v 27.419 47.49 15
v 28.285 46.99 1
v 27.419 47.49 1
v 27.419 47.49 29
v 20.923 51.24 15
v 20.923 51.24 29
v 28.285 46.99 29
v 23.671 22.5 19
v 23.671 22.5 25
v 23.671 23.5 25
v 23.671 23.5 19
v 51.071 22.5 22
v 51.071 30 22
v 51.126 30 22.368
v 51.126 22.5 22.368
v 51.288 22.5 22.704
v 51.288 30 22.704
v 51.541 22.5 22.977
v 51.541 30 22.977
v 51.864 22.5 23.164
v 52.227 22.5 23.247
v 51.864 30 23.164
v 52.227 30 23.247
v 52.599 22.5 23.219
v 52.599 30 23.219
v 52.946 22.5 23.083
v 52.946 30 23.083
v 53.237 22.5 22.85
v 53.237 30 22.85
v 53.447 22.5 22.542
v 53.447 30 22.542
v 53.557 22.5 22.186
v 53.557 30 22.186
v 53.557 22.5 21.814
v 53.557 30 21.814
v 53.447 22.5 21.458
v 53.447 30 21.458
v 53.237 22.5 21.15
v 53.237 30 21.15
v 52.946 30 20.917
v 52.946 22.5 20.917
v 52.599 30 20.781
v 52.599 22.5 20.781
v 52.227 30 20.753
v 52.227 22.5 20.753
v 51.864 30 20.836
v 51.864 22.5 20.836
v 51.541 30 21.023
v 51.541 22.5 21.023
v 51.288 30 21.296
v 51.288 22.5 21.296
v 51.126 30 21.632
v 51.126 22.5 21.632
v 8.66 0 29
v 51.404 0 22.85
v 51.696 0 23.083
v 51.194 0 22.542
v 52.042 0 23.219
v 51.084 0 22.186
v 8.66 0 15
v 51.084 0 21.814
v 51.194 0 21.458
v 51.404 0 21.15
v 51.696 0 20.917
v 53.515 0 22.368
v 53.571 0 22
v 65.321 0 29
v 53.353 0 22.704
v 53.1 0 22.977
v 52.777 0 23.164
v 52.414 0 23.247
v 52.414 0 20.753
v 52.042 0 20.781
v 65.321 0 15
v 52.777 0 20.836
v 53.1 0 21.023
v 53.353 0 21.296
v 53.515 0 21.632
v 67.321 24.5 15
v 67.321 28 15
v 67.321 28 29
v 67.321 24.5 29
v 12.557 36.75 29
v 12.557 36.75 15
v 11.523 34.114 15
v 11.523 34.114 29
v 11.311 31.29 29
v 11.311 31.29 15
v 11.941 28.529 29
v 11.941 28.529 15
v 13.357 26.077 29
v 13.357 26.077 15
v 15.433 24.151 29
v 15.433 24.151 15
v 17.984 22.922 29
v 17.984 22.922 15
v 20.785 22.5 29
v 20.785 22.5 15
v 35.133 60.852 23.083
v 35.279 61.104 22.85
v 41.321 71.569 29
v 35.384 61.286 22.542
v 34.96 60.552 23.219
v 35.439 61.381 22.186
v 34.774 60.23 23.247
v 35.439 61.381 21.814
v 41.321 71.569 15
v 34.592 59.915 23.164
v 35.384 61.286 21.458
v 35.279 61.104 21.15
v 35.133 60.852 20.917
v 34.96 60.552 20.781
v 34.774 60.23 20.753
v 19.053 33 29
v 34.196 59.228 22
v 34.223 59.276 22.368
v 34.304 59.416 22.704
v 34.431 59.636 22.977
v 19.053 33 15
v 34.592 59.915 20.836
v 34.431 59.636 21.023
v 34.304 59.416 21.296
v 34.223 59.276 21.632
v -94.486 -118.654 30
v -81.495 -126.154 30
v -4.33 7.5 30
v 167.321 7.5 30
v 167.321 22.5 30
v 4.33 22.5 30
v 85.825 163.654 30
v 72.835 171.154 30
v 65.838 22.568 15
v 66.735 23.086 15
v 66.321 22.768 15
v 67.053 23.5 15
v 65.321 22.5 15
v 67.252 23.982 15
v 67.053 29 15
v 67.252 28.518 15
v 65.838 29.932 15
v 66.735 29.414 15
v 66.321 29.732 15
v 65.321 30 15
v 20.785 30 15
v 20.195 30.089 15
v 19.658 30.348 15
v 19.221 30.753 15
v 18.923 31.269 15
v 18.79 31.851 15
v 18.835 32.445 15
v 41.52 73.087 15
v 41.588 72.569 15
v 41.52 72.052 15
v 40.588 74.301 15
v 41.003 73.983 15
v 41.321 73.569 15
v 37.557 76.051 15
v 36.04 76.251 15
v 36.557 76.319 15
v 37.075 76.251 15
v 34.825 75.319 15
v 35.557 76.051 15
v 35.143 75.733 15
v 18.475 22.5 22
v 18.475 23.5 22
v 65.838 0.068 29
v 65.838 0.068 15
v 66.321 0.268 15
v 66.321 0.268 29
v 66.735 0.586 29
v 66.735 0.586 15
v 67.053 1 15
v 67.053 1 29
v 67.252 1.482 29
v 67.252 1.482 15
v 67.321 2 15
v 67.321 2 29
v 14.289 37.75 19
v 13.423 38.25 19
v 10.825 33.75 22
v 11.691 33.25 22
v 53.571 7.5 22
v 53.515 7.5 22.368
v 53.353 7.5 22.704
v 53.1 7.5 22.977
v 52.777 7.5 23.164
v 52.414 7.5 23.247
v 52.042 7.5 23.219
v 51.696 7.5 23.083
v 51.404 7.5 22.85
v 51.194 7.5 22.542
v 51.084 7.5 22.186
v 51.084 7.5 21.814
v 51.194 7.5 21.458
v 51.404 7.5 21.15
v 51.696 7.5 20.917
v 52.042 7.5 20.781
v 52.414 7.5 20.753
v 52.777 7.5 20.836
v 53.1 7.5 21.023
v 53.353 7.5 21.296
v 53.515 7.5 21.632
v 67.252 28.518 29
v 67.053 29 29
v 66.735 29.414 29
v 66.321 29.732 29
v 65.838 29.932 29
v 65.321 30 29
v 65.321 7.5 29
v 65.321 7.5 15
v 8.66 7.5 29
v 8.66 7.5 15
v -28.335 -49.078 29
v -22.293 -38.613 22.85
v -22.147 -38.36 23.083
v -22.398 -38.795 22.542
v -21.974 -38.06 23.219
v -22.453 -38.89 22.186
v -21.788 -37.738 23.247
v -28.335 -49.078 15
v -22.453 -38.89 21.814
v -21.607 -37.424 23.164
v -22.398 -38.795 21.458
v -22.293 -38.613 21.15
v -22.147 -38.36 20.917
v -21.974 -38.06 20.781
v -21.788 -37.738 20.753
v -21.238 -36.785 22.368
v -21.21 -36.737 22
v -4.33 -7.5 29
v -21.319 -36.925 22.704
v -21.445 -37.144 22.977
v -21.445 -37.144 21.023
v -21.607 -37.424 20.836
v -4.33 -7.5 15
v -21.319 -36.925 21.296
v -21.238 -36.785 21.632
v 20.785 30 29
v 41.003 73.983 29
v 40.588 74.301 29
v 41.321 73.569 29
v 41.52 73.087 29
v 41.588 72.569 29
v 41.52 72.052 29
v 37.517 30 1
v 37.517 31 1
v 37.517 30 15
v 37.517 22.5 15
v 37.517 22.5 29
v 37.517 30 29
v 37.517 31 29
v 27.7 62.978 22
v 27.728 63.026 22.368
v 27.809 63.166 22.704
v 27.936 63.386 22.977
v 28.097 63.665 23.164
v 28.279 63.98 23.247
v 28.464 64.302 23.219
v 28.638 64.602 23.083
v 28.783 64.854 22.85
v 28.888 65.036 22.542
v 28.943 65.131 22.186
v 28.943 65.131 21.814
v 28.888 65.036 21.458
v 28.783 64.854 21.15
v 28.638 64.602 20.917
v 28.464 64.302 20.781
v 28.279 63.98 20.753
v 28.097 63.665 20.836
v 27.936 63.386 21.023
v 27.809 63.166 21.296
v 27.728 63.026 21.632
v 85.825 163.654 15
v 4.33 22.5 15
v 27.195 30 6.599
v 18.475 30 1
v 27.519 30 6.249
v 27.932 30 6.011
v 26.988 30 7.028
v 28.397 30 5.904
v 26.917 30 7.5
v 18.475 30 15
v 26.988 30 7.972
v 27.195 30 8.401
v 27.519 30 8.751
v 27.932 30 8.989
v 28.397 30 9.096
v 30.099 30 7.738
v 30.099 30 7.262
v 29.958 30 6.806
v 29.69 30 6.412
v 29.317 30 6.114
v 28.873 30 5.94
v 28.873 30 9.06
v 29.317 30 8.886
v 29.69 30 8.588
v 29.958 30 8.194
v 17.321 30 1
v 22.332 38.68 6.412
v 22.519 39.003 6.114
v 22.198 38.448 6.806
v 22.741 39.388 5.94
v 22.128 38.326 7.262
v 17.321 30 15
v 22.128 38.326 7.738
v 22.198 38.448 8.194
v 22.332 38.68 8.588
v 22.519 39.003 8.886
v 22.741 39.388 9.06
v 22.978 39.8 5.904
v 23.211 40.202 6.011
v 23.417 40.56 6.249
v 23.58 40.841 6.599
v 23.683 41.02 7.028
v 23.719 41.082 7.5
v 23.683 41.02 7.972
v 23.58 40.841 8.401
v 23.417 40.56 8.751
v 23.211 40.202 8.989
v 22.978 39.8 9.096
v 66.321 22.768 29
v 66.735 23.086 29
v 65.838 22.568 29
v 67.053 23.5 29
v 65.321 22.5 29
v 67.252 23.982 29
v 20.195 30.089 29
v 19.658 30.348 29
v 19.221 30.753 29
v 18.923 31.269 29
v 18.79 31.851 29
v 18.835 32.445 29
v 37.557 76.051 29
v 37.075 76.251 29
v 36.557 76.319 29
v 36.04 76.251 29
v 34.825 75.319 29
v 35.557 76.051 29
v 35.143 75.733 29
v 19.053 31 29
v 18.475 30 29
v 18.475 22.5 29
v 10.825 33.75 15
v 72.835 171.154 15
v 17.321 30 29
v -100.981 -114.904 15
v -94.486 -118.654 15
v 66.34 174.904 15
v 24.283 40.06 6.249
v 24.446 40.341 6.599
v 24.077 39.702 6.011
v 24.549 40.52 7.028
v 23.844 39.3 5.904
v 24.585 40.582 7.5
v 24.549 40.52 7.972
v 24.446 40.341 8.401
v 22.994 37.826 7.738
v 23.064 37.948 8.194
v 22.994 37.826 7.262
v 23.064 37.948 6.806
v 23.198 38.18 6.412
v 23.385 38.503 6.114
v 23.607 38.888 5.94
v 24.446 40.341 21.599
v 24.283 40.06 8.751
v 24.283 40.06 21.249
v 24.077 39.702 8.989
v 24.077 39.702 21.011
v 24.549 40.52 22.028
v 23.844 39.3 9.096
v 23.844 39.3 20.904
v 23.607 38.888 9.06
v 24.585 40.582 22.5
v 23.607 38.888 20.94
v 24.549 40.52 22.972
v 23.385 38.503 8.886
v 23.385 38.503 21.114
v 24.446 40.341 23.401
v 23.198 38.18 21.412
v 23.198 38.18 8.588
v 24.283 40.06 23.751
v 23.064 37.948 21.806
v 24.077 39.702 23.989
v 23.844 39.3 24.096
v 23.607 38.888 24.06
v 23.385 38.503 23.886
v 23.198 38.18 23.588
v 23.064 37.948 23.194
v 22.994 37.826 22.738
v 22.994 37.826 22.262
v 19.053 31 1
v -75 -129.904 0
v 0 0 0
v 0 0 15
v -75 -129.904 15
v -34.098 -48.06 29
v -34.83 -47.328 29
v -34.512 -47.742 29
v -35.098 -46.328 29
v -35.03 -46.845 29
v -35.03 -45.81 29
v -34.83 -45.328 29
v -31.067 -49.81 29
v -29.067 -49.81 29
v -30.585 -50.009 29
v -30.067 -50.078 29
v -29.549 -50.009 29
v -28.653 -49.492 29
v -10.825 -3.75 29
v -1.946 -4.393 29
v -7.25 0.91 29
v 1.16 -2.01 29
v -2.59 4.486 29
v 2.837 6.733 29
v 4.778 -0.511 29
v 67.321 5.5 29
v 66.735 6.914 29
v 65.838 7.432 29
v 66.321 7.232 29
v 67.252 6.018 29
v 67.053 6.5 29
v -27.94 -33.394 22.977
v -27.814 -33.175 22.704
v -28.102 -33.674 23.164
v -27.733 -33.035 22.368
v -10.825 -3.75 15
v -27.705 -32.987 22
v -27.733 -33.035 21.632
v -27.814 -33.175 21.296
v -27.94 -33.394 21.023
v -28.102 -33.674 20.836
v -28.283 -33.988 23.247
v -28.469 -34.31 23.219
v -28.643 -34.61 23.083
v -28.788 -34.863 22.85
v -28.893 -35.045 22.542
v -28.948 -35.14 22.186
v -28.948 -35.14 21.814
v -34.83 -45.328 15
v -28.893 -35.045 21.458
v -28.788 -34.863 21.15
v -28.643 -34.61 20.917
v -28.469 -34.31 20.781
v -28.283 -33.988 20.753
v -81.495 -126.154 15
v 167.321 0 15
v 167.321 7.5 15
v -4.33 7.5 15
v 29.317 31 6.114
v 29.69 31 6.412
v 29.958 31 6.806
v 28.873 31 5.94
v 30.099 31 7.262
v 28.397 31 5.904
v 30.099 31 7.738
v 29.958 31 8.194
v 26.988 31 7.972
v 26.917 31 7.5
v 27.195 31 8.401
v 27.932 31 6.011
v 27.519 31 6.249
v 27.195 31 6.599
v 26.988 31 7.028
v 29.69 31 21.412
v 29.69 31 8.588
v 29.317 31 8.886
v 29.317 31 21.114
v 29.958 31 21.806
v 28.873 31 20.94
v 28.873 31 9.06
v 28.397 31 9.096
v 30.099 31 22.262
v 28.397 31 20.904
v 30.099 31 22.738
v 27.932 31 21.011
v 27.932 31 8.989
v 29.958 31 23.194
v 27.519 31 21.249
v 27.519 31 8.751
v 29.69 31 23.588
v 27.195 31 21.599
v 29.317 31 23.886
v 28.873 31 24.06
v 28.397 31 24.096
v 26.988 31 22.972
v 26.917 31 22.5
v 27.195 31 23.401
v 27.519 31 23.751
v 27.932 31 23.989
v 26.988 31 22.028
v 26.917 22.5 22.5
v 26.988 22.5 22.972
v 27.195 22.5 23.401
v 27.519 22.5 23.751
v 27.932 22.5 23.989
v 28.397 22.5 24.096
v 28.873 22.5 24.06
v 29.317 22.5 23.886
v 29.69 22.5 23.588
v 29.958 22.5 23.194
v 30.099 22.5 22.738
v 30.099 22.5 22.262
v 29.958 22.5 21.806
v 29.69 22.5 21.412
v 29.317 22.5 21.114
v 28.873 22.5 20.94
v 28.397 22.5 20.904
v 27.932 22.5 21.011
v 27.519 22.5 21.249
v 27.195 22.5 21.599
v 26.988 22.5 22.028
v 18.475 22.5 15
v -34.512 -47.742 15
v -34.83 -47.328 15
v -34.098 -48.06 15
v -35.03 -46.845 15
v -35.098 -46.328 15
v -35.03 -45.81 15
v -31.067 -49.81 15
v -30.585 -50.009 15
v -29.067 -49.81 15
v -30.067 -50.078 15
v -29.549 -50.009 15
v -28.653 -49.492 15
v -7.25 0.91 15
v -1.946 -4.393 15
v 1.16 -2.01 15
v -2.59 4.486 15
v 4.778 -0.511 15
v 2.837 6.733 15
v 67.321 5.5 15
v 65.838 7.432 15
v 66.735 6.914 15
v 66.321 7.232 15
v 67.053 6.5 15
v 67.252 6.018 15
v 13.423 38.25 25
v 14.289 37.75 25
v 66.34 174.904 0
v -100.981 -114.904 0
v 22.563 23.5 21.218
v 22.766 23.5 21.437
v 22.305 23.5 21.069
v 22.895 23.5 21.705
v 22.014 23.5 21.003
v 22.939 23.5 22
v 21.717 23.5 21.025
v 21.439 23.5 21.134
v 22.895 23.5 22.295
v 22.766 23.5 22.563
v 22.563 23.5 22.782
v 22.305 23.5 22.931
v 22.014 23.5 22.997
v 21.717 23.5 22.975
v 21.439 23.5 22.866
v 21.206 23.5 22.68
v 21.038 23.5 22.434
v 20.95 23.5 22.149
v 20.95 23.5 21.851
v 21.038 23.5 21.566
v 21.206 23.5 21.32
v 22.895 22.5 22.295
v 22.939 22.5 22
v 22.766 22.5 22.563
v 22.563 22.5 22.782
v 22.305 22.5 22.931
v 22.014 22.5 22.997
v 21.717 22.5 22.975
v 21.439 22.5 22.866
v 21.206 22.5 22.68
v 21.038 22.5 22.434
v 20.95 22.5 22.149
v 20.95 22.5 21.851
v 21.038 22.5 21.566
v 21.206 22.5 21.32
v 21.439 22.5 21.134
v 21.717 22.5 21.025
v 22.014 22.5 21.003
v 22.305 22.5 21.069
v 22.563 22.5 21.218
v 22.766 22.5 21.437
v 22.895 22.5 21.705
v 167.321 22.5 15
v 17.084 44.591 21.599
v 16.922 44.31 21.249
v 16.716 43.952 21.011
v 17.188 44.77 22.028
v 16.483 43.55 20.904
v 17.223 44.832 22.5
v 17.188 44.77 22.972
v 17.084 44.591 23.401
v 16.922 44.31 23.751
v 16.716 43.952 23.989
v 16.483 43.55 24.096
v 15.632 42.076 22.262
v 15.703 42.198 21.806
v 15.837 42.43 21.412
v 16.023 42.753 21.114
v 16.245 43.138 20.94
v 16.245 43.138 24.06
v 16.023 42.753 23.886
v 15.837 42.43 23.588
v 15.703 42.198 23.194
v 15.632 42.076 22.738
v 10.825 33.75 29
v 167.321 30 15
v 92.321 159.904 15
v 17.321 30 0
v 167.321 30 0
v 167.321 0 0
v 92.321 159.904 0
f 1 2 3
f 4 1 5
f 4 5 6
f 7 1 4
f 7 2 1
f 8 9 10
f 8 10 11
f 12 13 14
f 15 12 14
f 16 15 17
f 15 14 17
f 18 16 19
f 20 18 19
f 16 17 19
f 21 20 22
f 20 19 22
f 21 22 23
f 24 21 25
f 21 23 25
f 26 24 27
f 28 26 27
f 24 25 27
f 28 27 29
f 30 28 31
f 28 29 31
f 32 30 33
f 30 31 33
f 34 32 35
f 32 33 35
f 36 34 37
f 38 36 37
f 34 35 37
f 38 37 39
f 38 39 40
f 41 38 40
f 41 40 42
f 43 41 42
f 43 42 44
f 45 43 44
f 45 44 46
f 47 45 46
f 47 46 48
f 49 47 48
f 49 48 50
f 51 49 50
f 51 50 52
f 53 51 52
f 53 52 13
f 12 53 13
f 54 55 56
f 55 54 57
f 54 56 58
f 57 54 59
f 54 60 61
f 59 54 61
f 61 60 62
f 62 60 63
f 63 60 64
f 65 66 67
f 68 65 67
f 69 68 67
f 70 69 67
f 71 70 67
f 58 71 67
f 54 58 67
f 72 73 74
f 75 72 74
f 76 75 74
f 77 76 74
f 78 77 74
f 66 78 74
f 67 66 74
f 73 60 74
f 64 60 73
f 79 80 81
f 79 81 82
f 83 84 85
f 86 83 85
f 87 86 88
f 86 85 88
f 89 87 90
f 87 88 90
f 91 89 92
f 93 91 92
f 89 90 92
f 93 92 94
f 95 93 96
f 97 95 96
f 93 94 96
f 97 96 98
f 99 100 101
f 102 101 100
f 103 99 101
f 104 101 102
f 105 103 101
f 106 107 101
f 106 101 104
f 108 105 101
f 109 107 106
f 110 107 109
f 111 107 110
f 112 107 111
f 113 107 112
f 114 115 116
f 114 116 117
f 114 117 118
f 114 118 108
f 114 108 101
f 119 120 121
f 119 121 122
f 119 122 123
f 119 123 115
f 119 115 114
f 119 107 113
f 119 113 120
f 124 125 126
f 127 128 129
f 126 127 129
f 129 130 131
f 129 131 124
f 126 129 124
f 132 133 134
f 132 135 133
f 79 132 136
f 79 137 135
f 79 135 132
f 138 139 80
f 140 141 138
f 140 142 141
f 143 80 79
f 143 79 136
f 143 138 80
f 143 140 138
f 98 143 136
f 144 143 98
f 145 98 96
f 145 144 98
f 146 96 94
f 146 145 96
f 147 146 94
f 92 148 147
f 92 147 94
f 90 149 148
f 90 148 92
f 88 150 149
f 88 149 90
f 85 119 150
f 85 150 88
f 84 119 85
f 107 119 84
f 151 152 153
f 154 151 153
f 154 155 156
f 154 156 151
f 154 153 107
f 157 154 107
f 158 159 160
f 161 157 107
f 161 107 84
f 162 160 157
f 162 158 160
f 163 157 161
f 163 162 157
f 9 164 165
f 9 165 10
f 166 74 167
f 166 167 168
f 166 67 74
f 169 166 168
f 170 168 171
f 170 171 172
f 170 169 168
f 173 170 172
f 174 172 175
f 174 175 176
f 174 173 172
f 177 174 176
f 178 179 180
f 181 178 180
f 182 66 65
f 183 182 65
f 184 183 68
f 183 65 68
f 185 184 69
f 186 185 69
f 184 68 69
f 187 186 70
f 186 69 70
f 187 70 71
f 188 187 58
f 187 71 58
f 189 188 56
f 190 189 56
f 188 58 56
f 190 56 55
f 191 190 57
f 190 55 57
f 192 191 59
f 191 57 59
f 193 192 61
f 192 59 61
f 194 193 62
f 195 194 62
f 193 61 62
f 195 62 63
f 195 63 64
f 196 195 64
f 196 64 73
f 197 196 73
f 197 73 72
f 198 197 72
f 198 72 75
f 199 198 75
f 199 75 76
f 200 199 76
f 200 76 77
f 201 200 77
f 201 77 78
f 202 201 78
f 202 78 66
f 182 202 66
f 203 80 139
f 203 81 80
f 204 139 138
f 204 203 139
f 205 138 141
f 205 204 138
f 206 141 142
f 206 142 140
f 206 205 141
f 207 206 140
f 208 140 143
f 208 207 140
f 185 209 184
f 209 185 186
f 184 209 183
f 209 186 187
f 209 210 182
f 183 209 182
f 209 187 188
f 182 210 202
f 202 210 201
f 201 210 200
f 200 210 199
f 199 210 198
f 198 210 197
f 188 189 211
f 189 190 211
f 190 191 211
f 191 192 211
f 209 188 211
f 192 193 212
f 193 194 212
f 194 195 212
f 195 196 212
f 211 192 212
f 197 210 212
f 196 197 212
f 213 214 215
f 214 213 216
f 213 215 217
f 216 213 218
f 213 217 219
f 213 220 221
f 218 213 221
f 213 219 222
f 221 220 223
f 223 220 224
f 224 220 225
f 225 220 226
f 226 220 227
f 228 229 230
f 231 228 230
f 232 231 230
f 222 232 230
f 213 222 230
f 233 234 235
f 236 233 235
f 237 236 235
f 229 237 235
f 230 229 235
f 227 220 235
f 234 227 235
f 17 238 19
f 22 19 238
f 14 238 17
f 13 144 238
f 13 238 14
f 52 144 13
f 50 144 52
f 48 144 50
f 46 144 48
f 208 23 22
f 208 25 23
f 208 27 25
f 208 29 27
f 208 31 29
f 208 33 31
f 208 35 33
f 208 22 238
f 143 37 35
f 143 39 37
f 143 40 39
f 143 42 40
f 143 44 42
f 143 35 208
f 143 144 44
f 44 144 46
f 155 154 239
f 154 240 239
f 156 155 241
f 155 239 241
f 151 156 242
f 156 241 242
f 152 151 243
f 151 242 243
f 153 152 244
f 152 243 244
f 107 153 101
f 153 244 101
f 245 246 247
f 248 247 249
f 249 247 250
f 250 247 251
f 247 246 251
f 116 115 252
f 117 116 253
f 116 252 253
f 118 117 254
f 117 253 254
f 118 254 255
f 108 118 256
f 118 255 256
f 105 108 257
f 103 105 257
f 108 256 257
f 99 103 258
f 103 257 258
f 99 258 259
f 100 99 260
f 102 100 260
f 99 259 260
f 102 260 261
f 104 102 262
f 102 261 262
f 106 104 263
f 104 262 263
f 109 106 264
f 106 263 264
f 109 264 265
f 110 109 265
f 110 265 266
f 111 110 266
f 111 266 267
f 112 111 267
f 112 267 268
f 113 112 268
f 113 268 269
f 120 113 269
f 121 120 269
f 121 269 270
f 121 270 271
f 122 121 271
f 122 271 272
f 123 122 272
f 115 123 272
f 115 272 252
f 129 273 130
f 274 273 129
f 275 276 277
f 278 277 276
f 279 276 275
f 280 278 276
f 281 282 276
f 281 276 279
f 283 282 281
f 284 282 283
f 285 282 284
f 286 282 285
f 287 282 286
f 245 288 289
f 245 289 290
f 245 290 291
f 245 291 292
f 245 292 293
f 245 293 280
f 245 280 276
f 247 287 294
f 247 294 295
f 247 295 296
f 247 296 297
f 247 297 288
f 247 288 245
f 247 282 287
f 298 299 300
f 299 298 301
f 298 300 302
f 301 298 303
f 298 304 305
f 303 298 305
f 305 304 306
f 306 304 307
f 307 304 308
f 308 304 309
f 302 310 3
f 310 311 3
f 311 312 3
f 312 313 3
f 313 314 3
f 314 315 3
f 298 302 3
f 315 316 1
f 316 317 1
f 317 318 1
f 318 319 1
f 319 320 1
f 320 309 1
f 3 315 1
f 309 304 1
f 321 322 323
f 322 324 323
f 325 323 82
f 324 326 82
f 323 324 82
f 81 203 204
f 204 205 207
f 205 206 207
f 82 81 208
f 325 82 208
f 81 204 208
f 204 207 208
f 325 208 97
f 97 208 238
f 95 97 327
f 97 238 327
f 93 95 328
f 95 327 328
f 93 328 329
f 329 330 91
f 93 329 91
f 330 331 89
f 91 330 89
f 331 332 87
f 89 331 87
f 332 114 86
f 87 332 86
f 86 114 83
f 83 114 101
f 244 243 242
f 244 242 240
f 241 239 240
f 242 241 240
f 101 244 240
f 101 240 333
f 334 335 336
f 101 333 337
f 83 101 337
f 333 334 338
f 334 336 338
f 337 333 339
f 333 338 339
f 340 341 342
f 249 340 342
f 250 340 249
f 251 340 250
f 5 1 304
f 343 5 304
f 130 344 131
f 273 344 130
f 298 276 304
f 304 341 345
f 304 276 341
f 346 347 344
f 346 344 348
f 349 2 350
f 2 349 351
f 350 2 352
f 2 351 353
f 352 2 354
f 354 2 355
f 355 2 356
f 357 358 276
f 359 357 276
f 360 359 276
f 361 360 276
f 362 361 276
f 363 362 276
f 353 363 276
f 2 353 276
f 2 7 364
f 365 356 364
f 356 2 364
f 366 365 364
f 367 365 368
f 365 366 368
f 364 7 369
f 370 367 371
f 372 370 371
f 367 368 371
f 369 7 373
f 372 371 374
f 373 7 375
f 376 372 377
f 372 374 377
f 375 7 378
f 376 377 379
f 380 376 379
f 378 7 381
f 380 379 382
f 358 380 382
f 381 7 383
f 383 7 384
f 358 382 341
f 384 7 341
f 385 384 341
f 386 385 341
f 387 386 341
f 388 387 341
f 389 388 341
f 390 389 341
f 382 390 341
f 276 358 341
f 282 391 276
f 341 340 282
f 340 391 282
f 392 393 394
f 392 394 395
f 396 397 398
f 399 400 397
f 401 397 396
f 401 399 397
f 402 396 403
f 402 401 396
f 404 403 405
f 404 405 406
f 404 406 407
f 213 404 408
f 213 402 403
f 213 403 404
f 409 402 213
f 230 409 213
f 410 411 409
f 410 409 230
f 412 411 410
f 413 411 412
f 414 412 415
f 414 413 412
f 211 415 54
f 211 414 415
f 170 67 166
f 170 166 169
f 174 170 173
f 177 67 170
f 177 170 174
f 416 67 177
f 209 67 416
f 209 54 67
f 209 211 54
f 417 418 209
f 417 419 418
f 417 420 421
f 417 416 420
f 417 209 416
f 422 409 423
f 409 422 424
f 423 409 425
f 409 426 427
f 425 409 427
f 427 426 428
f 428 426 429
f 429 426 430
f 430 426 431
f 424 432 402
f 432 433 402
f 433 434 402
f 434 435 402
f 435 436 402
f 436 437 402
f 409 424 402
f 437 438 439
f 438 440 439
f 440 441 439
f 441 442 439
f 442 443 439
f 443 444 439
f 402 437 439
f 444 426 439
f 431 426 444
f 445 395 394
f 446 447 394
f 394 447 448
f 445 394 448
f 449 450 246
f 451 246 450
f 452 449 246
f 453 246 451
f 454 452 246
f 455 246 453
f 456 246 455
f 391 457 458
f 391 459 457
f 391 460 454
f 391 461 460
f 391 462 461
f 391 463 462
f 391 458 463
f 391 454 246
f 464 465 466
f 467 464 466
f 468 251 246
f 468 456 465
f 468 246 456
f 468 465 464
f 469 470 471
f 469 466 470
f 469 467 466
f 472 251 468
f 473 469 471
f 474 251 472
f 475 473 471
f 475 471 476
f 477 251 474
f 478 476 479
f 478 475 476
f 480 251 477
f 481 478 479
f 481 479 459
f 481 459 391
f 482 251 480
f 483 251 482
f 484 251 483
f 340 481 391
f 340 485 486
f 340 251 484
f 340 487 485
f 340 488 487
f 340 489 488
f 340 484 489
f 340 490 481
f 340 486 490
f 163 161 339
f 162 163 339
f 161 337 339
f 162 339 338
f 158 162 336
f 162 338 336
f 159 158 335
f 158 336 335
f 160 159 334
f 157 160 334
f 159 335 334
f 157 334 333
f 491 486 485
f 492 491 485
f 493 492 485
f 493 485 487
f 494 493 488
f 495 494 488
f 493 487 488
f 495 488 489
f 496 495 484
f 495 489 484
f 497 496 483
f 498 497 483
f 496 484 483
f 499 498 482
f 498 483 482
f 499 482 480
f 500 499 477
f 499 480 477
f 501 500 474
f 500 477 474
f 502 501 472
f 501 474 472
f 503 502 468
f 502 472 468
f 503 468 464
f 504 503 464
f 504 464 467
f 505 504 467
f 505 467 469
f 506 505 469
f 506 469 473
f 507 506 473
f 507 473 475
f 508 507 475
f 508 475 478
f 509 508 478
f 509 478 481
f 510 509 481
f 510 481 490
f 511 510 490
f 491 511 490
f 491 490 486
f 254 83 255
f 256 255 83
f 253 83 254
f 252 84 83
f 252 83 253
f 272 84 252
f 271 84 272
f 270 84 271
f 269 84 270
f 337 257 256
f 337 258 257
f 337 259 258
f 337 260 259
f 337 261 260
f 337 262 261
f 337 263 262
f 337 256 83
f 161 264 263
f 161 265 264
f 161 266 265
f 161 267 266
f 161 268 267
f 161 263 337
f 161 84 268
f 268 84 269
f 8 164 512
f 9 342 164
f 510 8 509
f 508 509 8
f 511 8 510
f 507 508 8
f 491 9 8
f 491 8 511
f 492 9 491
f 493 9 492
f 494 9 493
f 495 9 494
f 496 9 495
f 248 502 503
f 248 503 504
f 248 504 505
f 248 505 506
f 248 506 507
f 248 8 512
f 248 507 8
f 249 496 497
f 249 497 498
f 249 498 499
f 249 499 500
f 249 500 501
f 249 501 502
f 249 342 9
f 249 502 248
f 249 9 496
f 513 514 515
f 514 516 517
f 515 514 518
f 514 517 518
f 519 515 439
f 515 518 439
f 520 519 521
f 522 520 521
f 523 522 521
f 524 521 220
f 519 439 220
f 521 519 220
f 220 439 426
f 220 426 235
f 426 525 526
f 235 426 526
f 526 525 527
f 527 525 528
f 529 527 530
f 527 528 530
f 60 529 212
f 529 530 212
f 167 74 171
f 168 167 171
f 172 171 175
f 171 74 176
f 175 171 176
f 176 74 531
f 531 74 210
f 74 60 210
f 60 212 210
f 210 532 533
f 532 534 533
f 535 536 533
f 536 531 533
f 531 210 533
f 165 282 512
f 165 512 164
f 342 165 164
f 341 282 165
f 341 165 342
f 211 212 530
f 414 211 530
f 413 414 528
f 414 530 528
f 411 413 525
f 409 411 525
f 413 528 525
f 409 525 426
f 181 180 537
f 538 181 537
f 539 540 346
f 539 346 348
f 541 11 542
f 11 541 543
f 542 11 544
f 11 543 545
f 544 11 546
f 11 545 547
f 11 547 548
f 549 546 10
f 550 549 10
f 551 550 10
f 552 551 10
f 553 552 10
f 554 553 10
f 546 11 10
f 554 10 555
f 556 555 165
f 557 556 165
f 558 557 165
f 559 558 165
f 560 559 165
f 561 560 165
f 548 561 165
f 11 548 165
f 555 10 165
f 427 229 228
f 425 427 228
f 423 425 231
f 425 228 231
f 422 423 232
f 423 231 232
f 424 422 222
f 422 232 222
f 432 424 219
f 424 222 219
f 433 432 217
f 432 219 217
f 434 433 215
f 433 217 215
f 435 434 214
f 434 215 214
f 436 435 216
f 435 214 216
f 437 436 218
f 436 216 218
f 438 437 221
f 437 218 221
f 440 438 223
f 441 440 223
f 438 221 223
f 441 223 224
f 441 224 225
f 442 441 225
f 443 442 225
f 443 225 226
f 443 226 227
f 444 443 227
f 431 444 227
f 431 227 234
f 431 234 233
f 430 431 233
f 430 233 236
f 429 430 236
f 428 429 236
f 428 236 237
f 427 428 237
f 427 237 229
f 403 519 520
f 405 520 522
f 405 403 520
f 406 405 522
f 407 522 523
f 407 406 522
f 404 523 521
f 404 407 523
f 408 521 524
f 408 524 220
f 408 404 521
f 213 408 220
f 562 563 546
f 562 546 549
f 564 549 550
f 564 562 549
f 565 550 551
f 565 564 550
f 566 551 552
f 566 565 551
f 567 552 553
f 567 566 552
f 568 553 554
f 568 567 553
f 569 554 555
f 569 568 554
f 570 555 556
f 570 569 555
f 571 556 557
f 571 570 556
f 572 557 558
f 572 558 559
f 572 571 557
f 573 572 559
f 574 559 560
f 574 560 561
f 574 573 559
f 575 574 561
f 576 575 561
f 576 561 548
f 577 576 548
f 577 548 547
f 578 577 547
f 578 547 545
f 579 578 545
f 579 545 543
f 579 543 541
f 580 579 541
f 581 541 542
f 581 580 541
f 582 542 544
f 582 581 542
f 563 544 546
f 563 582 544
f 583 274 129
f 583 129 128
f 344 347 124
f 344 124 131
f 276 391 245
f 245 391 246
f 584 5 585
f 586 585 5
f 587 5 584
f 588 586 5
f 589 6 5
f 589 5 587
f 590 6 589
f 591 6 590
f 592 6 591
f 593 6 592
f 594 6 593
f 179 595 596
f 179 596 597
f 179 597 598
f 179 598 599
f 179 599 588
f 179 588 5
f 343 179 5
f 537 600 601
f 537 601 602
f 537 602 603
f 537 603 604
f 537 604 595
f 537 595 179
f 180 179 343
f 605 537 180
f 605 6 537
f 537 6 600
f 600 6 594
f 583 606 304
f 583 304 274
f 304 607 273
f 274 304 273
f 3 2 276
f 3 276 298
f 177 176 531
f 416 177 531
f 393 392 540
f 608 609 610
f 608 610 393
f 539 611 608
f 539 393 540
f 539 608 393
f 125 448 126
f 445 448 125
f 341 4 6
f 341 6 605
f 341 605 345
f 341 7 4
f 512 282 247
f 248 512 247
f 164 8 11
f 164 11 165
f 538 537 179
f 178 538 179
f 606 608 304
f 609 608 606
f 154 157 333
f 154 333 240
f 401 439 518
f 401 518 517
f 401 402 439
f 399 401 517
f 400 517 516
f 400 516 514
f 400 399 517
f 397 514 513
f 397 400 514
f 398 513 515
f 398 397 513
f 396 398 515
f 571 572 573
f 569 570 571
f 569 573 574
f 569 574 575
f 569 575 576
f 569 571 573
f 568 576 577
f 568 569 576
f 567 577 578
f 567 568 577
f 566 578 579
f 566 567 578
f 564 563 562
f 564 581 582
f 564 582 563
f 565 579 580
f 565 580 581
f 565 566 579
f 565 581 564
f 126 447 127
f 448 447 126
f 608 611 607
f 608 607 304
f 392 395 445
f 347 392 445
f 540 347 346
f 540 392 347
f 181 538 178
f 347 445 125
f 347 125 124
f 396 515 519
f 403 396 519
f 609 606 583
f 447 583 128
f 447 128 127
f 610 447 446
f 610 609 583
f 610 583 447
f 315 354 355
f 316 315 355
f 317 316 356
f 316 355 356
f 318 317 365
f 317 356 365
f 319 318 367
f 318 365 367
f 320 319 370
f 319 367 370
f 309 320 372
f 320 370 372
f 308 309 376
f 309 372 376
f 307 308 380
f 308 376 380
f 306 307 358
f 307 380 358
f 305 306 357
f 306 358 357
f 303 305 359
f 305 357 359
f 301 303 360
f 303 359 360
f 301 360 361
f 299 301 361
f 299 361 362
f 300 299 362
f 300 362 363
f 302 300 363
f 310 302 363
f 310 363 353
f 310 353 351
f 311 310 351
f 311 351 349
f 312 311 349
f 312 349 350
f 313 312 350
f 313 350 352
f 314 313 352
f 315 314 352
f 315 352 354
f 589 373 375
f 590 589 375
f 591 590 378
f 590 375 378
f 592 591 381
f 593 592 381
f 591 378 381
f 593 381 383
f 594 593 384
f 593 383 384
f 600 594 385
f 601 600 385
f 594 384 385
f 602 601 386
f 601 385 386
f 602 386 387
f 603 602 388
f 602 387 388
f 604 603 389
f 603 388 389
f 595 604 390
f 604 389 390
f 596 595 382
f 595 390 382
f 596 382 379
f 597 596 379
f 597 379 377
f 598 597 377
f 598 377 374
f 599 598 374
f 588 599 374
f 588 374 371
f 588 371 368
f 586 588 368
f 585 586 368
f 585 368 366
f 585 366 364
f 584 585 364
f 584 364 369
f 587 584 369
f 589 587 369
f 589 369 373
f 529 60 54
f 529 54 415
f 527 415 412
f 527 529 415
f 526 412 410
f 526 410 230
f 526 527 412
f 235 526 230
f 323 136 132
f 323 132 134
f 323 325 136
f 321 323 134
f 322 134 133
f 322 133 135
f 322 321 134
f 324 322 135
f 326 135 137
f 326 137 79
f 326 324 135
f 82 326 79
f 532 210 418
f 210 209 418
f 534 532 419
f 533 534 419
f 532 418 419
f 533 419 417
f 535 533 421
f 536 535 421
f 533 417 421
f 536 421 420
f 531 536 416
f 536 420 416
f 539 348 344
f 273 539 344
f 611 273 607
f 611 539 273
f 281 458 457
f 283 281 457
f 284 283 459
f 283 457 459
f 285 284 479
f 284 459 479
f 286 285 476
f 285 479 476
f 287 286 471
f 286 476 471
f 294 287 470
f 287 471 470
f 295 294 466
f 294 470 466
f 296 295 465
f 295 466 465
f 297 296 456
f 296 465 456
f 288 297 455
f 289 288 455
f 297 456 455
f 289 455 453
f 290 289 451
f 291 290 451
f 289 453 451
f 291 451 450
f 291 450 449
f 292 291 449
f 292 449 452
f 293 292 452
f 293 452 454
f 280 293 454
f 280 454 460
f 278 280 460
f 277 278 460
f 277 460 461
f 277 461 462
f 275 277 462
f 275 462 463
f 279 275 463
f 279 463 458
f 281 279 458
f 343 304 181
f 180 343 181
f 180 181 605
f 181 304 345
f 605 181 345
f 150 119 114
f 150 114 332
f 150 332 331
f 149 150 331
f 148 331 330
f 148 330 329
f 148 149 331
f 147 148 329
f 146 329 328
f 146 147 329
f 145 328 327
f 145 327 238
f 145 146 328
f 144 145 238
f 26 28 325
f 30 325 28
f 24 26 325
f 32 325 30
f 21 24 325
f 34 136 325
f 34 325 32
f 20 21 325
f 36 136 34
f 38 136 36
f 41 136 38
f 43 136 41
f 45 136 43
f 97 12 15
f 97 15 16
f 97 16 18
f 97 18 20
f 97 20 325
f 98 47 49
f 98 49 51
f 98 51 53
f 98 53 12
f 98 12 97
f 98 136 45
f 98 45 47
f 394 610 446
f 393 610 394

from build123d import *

# Parameters (mm, degrees)
PAD_DEPTH       = 15
PAD001_DEPTH    = 15
PAD002_DEPTH    = 14
SKETCH006_R     = 1.25
POCKET002_DEPTH = 7.501
SKETCH007_R     = 1.25
POCKET003_DEPTH = 54.5522701892
FILLET001_R     = 2
PAD003_DEPTH    = 14
SKETCH004_R     = 1.25
POCKET_DEPTH    = 7.501
SKETCH005_R     = 1.25
POCKET001_DEPTH = 34.7808002192
FILLET_R        = 2
PAD004_DEPTH    = 14
SKETCH009_W     = 19.0414518843
SKETCH009_H     = 14
PAD005_DEPTH    = 7.5
SKETCH010_R     = 1.6
POCKET004_DEPTH = 8.501
SKETCH014_R     = 1
POCKET006_DEPTH = 1
PAD006_DEPTH    = 14
SKETCH012_W     = 20.1961524227
SKETCH012_H     = 14
PAD007_DEPTH    = 7.5
SKETCH013_R     = 1.6
POCKET005_DEPTH = 17.2461905284
POCKET007_DEPTH = 1


with BuildPart() as branche:
    # Sketch → Pad (new body)
    with BuildSketch(Plane.XY):
        Polygon((-100.9807621135, -114.9038105677), (66.3397459622, 174.9038105677), (92.3205080757, 159.9038105677), (17.3205080757, 30), (167.3205080757, 30), (167.3205080757, 0), (0, 0), (-75, -129.9038105677), align=None)
    extrude(amount=PAD_DEPTH)

    # Sketch001 (on Face10 of Pad) → Pad001 (join)
    with BuildSketch(Plane.XY.offset(15)):
        Polygon((85.8253175473, 163.6538105677), (4.3301270189, 22.5), (167.3205080757, 22.5), (167.3205080757, 7.5), (-4.3301270189, 7.5), (-81.4951905284, -126.1538105677), (-94.4855715851, -118.6538105677), (72.8349364905, 171.1538105677), align=None)
    extrude(amount=PAD001_DEPTH)


with BuildPart() as support_inter:
    # Sketch002 → Pad002 (new body)
    with BuildSketch(Plane.XY):
        with BuildLine():
            Line((67.3205080757, 22.5), (20.7846096908, 22.5))
            ThreePointArc((12.5573683549, 36.75), (12.5573683549, 27.25), (20.7846096908, 22.5))
            Line((12.5573683549, 36.75), (35.8253175473, 77.0512701892))
            Line((35.8253175473, 77.0512701892), (42.3205080757, 73.3012701892))
            Line((42.3205080757, 73.3012701892), (19.0525553763, 32.9999939257))
            ThreePointArc((19.0525553763, 32.9999939257), (19.0525606367, 30.9999969629), (20.7846096908, 30))
            Line((20.7846096908, 30), (67.3205080757, 30))
            Line((67.3205080757, 30), (67.3205080757, 22.5))
        make_face()
    extrude(amount=PAD002_DEPTH)

    # Sketch006 (on Face5 of Pad002) → Pocket002 (cut, through all)
    with BuildSketch(Plane(origin=(0, 30, 0), x_dir=(-1, 0, 0), z_dir=(0, 1, 0))):
        with Locations((-52.3205080757, 7)):
            Circle(SKETCH006_R)
    extrude(amount=-POCKET002_DEPTH, mode=Mode.SUBTRACT)

    # Sketch007 (on Face1 of Pocket002) → Pocket003 (cut, through all)
    with BuildSketch(Plane(origin=(-6.4951905284, 3.75, 0), x_dir=(-0.5, -0.8660254038, 0), z_dir=(-0.8660254038, 0.5, 0))):
        with Locations((-69.6410161514, 7)):
            Circle(SKETCH007_R)
    extrude(amount=-POCKET003_DEPTH, mode=Mode.SUBTRACT)

    # Fillet001
    fillet001_edges = [support_inter.edges().sort_by_distance(p)[0] for p in [
        (67.320508, 22.5, 7),
        (67.320508, 30, 7),
        (42.320508, 73.30127, 7),
        (35.825318, 77.05127, 7),
    ]]
    fillet(fillet001_edges, radius=FILLET001_R)


with BuildPart() as support_inter_1:
    # Body001 placement: moved
    add(support_inter.part.moved(Location((0, 0, 15))))


with BuildPart() as support_exter:
    # Sketch003 (on ShapeBinder) → Pad003 (new body)
    with BuildSketch(Plane.XY.offset(15)):
        with BuildLine():
            Line((-10.8253175473, -3.75), (-35.8301270189, -47.0596004384))
            Line((-35.8301270189, -47.0596004384), (-29.3349364905, -50.8096004384))
            Line((-29.3349364905, -50.8096004384), (-4.3301270189, -7.5))
            ThreePointArc((8.6602540378, 0), (1.1602540378, -2.0096189432), (-4.3301270189, -7.5))
            Line((8.6602540378, 0), (67.3205080757, 0))
            Line((67.3205080757, 0), (67.3205080757, 7.5))
            Line((67.3205080757, 7.5), (8.6602540378, 7.5))
            ThreePointArc((8.6602540378, 7.5), (-2.5897459622, 4.4855715852), (-10.8253175473, -3.75))
        make_face()
    extrude(amount=PAD003_DEPTH)

    # Sketch004 (on Face1 of Pad003) → Pocket (cut, through all)
    with BuildSketch(Plane.XZ):
        with Locations((52.3205080757, 22)):
            Circle(SKETCH004_R)
    extrude(amount=-POCKET_DEPTH, mode=Mode.SUBTRACT)

    # Sketch005 (on Face7 of Pocket) → Pocket001 (cut, through all)
    with BuildSketch(Plane(origin=(0, 0, 0), x_dir=(0.5, 0.8660254038, 0), z_dir=(0.8660254038, -0.5, 0))):
        with Locations((-43.6698729811, 22)):
            Circle(SKETCH005_R)
    extrude(amount=-POCKET001_DEPTH, mode=Mode.SUBTRACT)

    # Fillet
    fillet_edges = [support_exter.edges().sort_by_distance(p)[0] for p in [
        (-29.334936, -50.8096, 22),
        (-35.830127, -47.0596, 22),
        (67.320508, 0, 22),
        (67.320508, 7.5, 22),
    ]]
    fillet(fillet_edges, radius=FILLET_R)


with BuildPart() as support_charniere1:
    # Sketch008 (on Face1 of Binder001) → Pad004 (new body, symmetric)
    with BuildSketch(Plane.XY.offset(15)):
        Polygon((19.0525588833, 31), (18.4752086141, 30), (37.5166604984, 30), (37.5166604984, 31), align=None)
    extrude(amount=PAD004_DEPTH, both=True)

    # Sketch009 (on Face2 of Pad004) → Pad005 (join)
    with BuildSketch(Plane.XZ.offset(-30)):
        with Locations((27.9959345562, 22)):
            Rectangle(SKETCH009_W, SKETCH009_H)
    extrude(amount=PAD005_DEPTH)

    # Sketch010 (on Face2 of Pad005) → Pocket004 (cut, through all)
    with BuildSketch(Plane(origin=(0, 31, 0), x_dir=(-1, 0, 0), z_dir=(0, 1, 0))):
        with Locations((-28.5166604984, 22.5)):
            Circle(SKETCH010_R)
        with Locations((-28.5166604984, 7.5)):
            Circle(SKETCH010_R)
    extrude(amount=-POCKET004_DEPTH, mode=Mode.SUBTRACT)

    # Sketch014 (on Face12 of Pocket004) → Pocket006 (cut)
    with BuildSketch(Plane.XZ.offset(-22.5)):
        Polygon((23.6713610368, 25), (23.6713610368, 19), (18.4752086141, 22), align=None)
        with Locations((21.9393102292, 22)):
            Circle(SKETCH014_R, mode=Mode.SUBTRACT)
    extrude(amount=-POCKET006_DEPTH, mode=Mode.SUBTRACT)


with BuildPart() as support_charniere2:
    # Sketch011 (on ShapeBinder) → Pad006 (new body, symmetric)
    with BuildSketch(Plane.XY.offset(15)):
        Polygon((17.3205080757, 30), (27.418584287, 47.4903810568), (28.2846096908, 46.9903810568), (18.4752086141, 30), align=None)
    extrude(amount=PAD006_DEPTH, both=True)

    # Sketch012 (on Face1 of Pad006) → Pad007 (join)
    with BuildSketch(Plane(origin=(0, 0, 0), x_dir=(-0.5, -0.8660254038, 0), z_dir=(-0.8660254038, 0.5, 0))):
        with Locations((-44.7390923627, 22)):
            Rectangle(SKETCH012_W, SKETCH012_H)
    extrude(amount=PAD007_DEPTH)

    # Sketch013 (on Face6 of Pad007) → Pocket005 (cut, through all)
    with BuildSketch(Plane(origin=(0.8660254038, -0.5, 0), x_dir=(0.5, 0.8660254038, 0), z_dir=(0.8660254038, -0.5, 0))):
        with Locations((45.8371685741, 22.5)):
            Circle(SKETCH013_R)
        with Locations((45.8371685741, 7.5)):
            Circle(SKETCH013_R)
    extrude(amount=-POCKET005_DEPTH, mode=Mode.SUBTRACT)

    # Sketch015 (on Face11 of Pocket005) → Pocket007 (cut)
    with BuildSketch(Plane(origin=(-6.4951905284, 3.75, 0), x_dir=(-0.5, -0.8660254038, 0), z_dir=(-0.8660254038, 0.5, 0))):
        Polygon((-39.8371685741, 25), (-39.8371685741, 19), (-34.6410161514, 22), align=None)
    extrude(amount=-POCKET007_DEPTH, mode=Mode.SUBTRACT)


solid = Compound([branche.part, support_inter_1.part, support_exter.part, support_charniere1.part, support_charniere2.part])
